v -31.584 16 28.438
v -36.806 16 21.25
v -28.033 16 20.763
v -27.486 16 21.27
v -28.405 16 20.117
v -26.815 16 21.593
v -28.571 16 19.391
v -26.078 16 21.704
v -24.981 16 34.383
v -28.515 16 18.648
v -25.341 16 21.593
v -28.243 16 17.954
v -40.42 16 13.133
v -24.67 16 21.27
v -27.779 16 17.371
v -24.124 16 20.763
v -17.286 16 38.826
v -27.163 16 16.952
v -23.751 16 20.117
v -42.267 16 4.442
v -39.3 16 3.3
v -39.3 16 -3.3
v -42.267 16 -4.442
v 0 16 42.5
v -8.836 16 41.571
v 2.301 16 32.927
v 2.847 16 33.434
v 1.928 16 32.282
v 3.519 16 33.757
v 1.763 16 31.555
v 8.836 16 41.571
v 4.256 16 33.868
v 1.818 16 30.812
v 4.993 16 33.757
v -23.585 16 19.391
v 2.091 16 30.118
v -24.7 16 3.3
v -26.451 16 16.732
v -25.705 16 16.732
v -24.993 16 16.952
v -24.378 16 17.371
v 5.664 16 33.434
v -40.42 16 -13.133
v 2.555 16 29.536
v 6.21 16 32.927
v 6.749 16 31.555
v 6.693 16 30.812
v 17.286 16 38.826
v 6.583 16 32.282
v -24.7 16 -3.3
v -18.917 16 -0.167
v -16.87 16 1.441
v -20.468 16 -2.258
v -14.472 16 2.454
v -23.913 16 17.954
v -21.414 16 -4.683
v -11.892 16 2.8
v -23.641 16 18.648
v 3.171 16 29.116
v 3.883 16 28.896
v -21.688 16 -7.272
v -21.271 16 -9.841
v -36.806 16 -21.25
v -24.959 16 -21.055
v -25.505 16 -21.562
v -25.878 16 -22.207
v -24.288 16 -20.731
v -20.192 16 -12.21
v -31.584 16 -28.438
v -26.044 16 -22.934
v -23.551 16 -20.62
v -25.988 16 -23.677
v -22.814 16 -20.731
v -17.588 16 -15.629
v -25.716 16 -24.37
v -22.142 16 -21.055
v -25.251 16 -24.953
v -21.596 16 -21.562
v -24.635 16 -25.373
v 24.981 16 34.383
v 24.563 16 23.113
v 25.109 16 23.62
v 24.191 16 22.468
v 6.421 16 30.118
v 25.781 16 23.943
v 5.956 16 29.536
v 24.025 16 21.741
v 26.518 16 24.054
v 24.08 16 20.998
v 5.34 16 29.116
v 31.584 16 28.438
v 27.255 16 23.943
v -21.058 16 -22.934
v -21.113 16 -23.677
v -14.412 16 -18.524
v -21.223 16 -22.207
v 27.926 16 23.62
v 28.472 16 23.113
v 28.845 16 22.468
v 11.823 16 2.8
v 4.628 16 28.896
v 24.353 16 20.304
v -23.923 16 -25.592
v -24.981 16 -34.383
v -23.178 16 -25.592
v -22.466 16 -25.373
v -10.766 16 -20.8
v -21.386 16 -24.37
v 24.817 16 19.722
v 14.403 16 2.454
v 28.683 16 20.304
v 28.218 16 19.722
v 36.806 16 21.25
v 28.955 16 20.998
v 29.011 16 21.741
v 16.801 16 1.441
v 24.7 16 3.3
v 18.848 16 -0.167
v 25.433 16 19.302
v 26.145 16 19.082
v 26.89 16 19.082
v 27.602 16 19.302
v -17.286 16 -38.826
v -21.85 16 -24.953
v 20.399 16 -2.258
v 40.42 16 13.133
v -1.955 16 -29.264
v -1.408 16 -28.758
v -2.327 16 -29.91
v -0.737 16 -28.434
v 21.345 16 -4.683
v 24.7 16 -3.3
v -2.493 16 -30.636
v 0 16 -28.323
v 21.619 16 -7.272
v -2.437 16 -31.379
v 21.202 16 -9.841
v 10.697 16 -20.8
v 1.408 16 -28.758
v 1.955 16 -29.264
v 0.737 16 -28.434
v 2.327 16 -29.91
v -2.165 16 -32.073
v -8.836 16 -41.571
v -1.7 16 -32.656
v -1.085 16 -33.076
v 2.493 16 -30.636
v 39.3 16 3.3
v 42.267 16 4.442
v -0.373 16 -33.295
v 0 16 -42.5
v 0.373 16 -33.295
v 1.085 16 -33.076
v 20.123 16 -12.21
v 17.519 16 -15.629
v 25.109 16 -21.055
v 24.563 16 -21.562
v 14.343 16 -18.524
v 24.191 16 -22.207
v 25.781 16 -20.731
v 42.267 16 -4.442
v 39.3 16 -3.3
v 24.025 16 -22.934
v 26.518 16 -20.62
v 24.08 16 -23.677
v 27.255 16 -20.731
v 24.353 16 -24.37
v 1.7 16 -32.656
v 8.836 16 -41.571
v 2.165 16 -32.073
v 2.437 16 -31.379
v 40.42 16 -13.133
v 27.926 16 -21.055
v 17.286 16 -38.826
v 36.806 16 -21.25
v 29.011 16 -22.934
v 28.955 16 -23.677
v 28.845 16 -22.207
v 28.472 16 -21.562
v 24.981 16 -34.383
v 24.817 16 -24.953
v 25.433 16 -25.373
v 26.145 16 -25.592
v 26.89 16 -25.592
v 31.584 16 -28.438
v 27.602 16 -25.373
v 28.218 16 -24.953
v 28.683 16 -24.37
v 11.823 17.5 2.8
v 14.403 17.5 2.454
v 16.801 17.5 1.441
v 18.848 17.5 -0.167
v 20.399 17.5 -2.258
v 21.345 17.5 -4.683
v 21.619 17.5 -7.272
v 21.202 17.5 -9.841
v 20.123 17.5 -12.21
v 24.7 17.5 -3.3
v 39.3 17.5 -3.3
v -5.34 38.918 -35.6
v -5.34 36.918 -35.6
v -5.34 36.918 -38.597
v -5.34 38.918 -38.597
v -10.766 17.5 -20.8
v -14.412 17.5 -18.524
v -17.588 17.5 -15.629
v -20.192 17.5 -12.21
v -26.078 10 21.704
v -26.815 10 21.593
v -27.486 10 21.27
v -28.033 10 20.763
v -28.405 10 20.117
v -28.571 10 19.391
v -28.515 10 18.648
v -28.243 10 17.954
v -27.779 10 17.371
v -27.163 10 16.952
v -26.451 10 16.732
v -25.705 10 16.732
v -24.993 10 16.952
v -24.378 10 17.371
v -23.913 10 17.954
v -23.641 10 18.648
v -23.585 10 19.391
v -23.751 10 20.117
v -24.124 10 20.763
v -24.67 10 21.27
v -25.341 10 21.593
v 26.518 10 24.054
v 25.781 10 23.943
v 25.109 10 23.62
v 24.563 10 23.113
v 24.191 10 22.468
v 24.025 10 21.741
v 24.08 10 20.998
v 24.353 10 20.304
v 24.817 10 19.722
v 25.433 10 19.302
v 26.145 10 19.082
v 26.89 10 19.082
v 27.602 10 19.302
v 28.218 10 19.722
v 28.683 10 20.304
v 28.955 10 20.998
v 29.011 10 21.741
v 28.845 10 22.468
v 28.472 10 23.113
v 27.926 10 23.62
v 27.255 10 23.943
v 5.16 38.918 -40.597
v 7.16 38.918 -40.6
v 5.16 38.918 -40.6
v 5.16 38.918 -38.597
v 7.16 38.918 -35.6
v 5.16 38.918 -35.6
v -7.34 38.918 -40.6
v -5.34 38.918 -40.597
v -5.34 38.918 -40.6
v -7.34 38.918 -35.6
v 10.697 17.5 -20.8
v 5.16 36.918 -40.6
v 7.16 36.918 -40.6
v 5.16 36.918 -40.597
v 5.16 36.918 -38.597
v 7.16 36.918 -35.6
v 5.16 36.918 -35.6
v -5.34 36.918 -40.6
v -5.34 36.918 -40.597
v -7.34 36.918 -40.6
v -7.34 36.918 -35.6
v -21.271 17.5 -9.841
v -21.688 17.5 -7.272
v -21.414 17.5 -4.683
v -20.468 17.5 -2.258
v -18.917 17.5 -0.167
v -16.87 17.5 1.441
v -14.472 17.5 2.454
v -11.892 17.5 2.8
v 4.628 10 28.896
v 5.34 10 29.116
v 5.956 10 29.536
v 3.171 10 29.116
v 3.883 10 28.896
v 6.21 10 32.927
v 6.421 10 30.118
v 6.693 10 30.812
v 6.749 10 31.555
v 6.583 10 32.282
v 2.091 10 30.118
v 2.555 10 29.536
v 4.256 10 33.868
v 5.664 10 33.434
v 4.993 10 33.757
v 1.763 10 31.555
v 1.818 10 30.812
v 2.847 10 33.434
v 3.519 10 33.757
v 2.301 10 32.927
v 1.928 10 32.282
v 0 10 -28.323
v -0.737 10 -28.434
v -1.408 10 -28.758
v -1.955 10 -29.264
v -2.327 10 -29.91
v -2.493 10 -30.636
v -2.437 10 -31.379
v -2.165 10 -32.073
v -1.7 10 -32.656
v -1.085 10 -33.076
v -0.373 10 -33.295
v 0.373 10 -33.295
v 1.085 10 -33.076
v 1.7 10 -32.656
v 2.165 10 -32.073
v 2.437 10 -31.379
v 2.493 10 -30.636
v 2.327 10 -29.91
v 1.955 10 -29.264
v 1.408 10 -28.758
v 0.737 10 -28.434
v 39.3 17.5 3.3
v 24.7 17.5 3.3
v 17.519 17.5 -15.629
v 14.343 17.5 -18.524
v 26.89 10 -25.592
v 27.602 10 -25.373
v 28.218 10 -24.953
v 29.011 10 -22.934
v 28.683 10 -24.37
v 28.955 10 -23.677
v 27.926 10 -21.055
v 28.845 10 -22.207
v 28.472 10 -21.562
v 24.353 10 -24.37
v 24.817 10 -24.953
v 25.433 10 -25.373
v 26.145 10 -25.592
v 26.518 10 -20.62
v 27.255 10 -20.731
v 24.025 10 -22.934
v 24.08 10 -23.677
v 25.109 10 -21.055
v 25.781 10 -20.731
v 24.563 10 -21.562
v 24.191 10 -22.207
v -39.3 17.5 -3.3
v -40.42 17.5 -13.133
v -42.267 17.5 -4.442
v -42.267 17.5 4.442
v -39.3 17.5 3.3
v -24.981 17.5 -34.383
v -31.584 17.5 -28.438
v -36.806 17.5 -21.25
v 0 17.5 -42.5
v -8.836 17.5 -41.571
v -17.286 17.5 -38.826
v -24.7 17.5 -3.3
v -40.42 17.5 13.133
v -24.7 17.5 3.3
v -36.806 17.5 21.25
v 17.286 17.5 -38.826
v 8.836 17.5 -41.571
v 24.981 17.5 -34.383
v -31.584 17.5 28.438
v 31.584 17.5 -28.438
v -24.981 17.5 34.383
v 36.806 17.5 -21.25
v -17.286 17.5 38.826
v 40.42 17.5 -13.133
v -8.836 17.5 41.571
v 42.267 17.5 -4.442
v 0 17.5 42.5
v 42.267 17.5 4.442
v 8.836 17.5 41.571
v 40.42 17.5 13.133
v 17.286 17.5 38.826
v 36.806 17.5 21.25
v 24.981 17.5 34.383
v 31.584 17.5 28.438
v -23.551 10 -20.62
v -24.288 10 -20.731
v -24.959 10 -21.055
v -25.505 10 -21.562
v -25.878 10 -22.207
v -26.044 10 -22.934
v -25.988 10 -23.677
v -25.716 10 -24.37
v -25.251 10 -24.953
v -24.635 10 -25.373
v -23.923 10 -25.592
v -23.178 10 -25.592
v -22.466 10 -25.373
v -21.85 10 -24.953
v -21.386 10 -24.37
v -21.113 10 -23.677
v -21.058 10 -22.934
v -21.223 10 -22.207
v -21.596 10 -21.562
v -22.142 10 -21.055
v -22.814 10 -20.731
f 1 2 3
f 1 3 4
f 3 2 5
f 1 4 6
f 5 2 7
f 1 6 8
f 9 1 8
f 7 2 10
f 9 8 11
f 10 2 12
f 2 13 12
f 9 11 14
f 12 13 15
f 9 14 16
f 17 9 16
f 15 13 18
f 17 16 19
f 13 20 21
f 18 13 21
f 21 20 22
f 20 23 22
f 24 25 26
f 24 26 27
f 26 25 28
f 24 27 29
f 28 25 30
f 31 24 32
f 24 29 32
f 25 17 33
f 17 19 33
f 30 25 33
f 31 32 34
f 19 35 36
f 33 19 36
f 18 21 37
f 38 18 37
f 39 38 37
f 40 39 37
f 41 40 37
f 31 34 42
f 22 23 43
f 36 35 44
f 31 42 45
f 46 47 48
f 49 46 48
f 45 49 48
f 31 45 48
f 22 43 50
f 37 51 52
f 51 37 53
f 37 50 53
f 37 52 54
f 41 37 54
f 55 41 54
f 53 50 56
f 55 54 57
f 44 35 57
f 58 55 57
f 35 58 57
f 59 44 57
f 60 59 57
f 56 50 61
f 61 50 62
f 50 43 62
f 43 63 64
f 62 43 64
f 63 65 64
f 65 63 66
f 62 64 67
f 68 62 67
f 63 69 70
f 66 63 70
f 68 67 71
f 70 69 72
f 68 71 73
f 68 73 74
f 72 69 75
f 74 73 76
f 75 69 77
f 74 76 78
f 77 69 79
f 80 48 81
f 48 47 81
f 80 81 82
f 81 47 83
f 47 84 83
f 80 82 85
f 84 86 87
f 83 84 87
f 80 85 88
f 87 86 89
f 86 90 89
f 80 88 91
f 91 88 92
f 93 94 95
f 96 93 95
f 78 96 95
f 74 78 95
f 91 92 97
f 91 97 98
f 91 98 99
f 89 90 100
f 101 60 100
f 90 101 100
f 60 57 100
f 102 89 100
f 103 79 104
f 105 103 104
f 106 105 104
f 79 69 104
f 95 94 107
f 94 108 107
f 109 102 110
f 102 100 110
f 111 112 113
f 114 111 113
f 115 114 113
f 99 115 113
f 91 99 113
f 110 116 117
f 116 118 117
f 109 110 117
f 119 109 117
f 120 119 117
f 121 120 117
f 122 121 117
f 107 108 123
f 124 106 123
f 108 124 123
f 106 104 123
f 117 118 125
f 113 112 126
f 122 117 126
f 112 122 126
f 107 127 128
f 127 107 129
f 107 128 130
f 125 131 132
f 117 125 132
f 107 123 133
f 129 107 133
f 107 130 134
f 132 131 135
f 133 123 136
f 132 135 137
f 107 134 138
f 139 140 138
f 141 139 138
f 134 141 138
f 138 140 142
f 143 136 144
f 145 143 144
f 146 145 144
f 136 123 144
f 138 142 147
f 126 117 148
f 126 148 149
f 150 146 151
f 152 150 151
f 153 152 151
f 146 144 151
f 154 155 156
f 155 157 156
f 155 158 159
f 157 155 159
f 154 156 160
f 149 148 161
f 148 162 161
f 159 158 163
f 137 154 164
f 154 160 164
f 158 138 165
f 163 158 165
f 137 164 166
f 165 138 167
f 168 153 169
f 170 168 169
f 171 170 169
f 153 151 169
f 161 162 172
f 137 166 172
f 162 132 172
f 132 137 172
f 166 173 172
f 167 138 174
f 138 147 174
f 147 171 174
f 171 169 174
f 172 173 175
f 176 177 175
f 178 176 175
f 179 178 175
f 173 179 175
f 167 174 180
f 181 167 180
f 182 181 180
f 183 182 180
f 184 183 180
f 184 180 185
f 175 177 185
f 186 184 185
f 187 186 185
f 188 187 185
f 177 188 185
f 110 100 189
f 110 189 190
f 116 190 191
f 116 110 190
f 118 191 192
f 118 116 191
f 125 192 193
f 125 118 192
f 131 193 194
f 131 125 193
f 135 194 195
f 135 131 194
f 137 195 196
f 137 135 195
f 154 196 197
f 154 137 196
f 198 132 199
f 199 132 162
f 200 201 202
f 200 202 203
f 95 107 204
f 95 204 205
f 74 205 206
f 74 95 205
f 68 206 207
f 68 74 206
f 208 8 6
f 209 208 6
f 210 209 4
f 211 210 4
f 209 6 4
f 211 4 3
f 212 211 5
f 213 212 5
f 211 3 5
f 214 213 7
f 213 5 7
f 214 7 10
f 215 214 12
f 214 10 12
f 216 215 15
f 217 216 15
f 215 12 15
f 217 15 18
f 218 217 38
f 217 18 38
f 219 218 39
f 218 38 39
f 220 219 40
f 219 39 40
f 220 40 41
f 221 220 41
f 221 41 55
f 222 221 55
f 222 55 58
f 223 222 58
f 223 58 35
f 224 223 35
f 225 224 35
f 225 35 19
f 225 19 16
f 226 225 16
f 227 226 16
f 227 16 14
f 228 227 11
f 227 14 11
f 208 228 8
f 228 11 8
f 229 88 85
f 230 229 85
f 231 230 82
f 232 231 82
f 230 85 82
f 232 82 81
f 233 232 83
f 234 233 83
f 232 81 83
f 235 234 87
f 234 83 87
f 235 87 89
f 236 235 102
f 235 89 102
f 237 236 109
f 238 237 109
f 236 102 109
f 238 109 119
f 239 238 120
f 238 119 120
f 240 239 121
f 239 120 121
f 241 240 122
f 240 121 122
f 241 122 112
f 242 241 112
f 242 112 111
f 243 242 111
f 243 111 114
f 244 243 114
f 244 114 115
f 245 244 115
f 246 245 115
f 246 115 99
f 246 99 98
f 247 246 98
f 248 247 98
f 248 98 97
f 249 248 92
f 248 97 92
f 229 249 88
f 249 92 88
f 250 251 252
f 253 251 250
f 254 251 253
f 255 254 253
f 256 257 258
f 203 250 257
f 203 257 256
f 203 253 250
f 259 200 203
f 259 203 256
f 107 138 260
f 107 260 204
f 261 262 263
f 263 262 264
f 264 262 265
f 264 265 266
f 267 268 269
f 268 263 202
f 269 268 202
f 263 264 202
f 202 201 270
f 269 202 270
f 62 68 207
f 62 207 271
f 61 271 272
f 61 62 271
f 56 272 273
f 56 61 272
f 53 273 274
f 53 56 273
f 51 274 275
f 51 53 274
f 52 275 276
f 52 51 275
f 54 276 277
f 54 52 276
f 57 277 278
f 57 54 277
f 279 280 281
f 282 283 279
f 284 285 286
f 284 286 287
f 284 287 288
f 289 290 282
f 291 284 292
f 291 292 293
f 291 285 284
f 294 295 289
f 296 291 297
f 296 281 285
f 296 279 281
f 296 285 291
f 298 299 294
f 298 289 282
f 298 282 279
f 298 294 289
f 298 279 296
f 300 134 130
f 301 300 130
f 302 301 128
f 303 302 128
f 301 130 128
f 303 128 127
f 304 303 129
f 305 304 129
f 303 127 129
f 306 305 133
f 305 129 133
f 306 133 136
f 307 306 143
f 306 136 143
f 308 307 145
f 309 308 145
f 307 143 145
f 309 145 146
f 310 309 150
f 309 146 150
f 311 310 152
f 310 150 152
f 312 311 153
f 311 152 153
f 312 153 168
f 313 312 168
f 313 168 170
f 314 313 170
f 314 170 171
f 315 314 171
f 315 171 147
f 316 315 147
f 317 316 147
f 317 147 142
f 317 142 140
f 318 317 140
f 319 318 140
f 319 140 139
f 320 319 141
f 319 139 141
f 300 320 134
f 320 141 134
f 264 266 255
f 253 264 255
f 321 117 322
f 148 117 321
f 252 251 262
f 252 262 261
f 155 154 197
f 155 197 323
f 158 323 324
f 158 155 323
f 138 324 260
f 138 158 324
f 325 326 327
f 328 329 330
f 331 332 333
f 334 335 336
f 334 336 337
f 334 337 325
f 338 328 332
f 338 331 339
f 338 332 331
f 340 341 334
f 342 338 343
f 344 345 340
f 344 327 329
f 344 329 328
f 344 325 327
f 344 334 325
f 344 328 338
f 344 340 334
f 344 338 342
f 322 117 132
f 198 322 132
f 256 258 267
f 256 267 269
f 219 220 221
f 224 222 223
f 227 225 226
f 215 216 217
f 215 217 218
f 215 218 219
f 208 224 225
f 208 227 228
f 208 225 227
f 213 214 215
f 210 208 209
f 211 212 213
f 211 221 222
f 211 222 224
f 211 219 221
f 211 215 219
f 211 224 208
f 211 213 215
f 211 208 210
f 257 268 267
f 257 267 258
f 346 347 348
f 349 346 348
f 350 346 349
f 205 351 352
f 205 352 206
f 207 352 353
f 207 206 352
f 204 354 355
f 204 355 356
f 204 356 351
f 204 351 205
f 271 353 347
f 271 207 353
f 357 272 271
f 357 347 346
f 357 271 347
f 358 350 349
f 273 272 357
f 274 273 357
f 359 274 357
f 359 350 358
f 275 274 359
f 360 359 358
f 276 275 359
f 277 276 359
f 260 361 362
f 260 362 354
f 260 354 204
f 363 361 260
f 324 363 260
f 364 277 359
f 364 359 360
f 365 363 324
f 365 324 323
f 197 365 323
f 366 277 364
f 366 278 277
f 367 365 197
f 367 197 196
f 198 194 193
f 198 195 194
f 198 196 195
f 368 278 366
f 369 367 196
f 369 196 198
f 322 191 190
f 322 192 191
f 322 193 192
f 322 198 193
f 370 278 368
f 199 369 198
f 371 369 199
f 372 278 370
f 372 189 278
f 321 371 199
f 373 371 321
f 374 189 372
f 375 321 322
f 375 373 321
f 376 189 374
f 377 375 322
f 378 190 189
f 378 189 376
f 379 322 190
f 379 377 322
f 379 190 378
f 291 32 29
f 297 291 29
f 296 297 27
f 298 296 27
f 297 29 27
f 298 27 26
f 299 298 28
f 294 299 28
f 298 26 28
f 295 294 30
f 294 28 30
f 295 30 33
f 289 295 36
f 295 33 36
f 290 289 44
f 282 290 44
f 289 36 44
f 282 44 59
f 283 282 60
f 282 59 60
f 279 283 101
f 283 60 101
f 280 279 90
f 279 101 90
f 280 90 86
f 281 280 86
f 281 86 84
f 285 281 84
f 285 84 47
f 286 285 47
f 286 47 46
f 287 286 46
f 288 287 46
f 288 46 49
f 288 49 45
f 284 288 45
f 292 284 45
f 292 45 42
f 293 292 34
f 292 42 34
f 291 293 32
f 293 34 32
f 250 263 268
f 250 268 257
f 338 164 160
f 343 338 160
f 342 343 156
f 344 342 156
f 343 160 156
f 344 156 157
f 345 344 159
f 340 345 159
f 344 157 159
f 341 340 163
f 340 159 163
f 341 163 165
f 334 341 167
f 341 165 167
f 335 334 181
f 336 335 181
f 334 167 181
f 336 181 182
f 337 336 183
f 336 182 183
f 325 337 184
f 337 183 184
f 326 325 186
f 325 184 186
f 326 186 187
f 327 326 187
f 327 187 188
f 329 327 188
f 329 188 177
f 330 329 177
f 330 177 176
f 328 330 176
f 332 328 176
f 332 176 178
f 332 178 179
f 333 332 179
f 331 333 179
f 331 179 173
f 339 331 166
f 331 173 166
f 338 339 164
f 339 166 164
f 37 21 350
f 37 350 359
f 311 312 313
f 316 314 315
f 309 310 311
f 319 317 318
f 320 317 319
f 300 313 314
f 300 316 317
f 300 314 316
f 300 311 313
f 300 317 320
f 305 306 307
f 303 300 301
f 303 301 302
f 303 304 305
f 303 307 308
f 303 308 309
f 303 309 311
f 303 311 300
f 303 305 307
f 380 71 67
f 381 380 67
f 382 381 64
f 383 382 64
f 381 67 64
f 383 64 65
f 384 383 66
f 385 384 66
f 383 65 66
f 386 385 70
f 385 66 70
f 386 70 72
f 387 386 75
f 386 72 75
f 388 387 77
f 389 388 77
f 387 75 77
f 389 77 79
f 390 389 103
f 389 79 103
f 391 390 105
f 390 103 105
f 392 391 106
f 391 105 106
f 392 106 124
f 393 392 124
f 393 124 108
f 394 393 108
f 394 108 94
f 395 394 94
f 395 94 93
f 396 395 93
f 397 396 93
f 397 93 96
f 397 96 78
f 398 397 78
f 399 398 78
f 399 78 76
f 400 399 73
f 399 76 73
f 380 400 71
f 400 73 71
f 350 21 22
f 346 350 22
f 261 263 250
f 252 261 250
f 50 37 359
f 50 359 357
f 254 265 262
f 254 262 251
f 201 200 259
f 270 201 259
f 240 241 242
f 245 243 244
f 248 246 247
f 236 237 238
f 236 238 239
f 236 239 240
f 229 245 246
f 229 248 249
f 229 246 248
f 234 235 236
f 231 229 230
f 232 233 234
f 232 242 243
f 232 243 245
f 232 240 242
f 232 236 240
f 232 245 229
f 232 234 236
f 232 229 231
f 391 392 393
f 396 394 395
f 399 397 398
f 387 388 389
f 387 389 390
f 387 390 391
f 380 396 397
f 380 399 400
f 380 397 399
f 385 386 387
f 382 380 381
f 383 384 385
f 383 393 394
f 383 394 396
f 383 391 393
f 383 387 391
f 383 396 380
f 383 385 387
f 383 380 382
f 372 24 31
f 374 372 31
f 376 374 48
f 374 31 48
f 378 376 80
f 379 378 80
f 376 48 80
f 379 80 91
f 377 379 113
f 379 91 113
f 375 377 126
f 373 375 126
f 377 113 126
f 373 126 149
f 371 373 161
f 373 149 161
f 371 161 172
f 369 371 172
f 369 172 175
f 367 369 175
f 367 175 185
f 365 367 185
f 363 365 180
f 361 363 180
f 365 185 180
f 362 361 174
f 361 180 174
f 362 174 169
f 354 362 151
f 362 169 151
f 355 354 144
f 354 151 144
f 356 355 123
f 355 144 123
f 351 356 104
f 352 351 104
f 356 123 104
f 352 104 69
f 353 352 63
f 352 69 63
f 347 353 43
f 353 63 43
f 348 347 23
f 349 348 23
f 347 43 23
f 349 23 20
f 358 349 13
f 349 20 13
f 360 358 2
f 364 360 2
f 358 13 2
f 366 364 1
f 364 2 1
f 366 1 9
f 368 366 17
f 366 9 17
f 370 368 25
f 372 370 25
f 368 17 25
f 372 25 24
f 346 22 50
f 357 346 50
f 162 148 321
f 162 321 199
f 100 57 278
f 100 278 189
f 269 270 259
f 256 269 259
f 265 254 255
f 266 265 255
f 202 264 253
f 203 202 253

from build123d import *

# Parameters (mm, degrees)
CUT_EXTRUDE1_DEPTH           = 5
CUT_EXTRUDE3_DEPTH           = 60
SKETCH8_R                    = 43
CUT_EXTRUDE4_DEPTH           = 53
FILLET1_R                    = 7
SKETCH12_W                   = 6.5
SKETCH12_H                   = 51.5
CUT_REVOLVE1_ANGLE           = 60
CUT_REVOLVE1_OTHER_WAY_ANGLE = 60
SKETCH18_W                   = 13
SKETCH18_H                   = 8
CUT_EXTRUDE13_DEPTH          = 5
SKETCH20_W                   = 100
SKETCH20_H                   = 7
CUT_EXTRUDE15_DEPTH          = 5
SKETCH19_R                   = 1.5
CUT_EXTRUDE14_DEPTH          = 12
FILLET3_R                    = 4
SKETCH24_W                   = 2
SKETCH24_H                   = 3
BOSS_EXTRUDE3_DEPTH          = 2
CIRPATTERN2_COUNT            = 5
SKETCH26_W                   = 5
SKETCH26_H                   = 51.5
CUT_REVOLVE2_ANGLE           = 50
CUT_REVOLVE2_OTHER_WAY_ANGLE = 50
SKETCH29_W                   = 16.2
SKETCH29_H                   = 11.2
SKETCH29_W_2                 = 13
SKETCH29_H_2                 = 8
BOSS_EXTRUDE4_DEPTH          = 19
SKETCH36_W                   = 2
SKETCH36_H                   = 2
BOSS_EXTRUDE7_DEPTH          = 5
SKETCH37_W                   = 2
SKETCH37_H                   = 2
BOSS_EXTRUDE8_DEPTH          = 12.5
SKETCH40_W                   = 2
SKETCH40_H                   = 2
BOSS_EXTRUDE9_DEPTH          = 5
FILLET8_R                    = 9
SKETCH50_W                   = 13
SKETCH50_H                   = 5
CUT_EXTRUDE23_DEPTH          = 7
SKETCH51_R                   = 42.5
SKETCH51_W                   = 14.6
SKETCH51_H                   = 6.6
BOSS_EXTRUDE10_DEPTH         = 1.5
INTERSECT2_START             = 17.5
INTERSECT2_OUTLINE_R         = 45
INTERSECT2_OUTLINE_W         = 13
INTERSECT2_OUTLINE_H         = 8
INTERSECT2_DEPTH             = 59
INTERSECT2_2_OUTLINE_R       = 45
INTERSECT2_2_OUTLINE_W       = 13
INTERSECT2_2_OUTLINE_H       = 5
INTERSECT2_2_DEPTH           = 16
INTERSECT2_START_2           = 16
INTERSECT2_3_OUTLINE_R       = 45
INTERSECT2_3_OUTLINE_R_2     = 43
INTERSECT2_3_DEPTH           = 1.5
SKETCH52_R                   = 2.5
BOSS_EXTRUDE11_DEPTH         = 6


# Read off the part's stored shape, not the designer's step: Intersect2
with BuildPart() as part:
    # Sketch1 → Revolve1 (revolve)
    with BuildSketch(Plane.XY, mode=Mode.PRIVATE) as revolve1_sk:
        with BuildLine():
            Line((0, 76.5), (0, 11.5))
            Line((0, 11.5), (22.5, 11.5))
            Line((22.5, 11.5), (22.5, 0))
            Line((22.5, 0), (25, 0))
            Line((25, 0), (25, 11.5))
            Line((25, 11.5), (45, 11.5))
            Line((45, 11.5), (45, 71.5))
            ThreePointArc((45, 71.5), (43.535533906, 75.035533906), (40, 76.5))
            Line((40, 76.5), (0, 76.5))
        make_face()
    revolve(revolve1_sk.sketch.rotate(Axis((0, 2, 0), (0, 1, 0)), 90), axis=Axis((0, 2, 0), (0, 1, 0)))

    # Sketch5 → Cut-Extrude1 (cut)
    with BuildSketch(Plane(origin=(0, 76.5, 0), x_dir=(1, 0, 0), z_dir=(0, 1, 0))):
        with BuildLine():
            Line((-45, 0), (45, 0))
            ThreePointArc((45, 0), (0, 45), (-45, 0))
        make_face()
    extrude(amount=-CUT_EXTRUDE1_DEPTH, mode=Mode.SUBTRACT)

    # Sketch7 → Cut-Extrude3 (cut)
    with BuildSketch(Plane.XZ.offset(-11.5)):
        with BuildLine():
            Line((21, 0), (-21, 0))
            ThreePointArc((-21, 0), (-18.277714988, -10.340461055), (-10.816653826, -18))
            Line((-10.816653826, -18), (10.816653826, -18))
            ThreePointArc((10.816653826, -18), (18.277714988, -10.340461055), (21, 0))
        make_face()
    extrude(amount=-CUT_EXTRUDE3_DEPTH, mode=Mode.SUBTRACT)

    # Sketch8 → Cut-Extrude4 (cut)
    with BuildSketch(Plane(origin=(0, 69, 0), x_dir=(1, 0, 0), z_dir=(0, 1, 0))):
        with Locations(Location((0, 0, 0), (0, 0, 270))):
            Circle(SKETCH8_R)
        with BuildLine():
            Line((22.912878475, -2), (-22.981606036, -2))
            ThreePointArc((-22.981606036, -2), (-20.067855169, 10.855581536), (-10.573881727, 20))
            Line((-10.573881727, 20), (10.505154166, 20))
            ThreePointArc((10.505154166, 20), (19.999127608, 10.855581536), (22.912878475, -2))
        make_face(mode=Mode.SUBTRACT)
    extrude(amount=-CUT_EXTRUDE4_DEPTH, mode=Mode.SUBTRACT)

    # Fillet1
    fillet1_edges = [part.edges().sort_by_distance(p)[0] for p in [
        (-21, 41.5, 0),
        (21, 41.5, 0),
    ]]
    fillet(fillet1_edges, radius=FILLET1_R)

    # Sketch12 → Cut-Revolve1 (revolve, cut)
    with BuildSketch(Plane(origin=(0, 0, 0), x_dir=(0, 0, -1), z_dir=(1, 0, 0))):
        with Locations((-44.75, 43.25)):
            Rectangle(SKETCH12_W, SKETCH12_H)
    revolve(axis=Axis((0, 71.5, 0), (0, -1, 0)), revolution_arc=CUT_REVOLVE1_ANGLE, mode=Mode.SUBTRACT)

    # Sketch12 → Cut-Revolve1 other way (revolve, cut)
    with BuildSketch(Plane(origin=(0, 0, 0), x_dir=(0, 0, -1), z_dir=(1, 0, 0))):
        with Locations((-44.75, 43.25)):
            Rectangle(SKETCH12_W, SKETCH12_H)
    revolve(axis=Axis((0, 71.5, 0), (0, 1, 0)), revolution_arc=CUT_REVOLVE1_OTHER_WAY_ANGLE, mode=Mode.SUBTRACT)

    # Sketch18 → Cut-Extrude13 (cut)
    with BuildSketch(Plane(origin=(0, 71.5, 0), x_dir=(1, 0, 0), z_dir=(0, 1, 0))):
        with Locations((0, 30)):
            Rectangle(SKETCH18_W, SKETCH18_H)
    extrude(amount=-CUT_EXTRUDE13_DEPTH, mode=Mode.SUBTRACT)

    # Sketch20 → Cut-Extrude15 (cut)
    with BuildSketch(Plane(origin=(0, 76.5, 0), x_dir=(1, 0, 0), z_dir=(0, 1, 0))):
        with Locations((0, -3.5)):
            Rectangle(SKETCH20_W, SKETCH20_H)
    extrude(amount=-CUT_EXTRUDE15_DEPTH, mode=Mode.SUBTRACT)

    # Sketch19 → Cut-Extrude14 (cut)
    with BuildSketch(Plane(origin=(0, 0, 7), x_dir=(-1, 0, 0), z_dir=(0, 0, -1))):
        with Locations((0, 74)):
            Circle(SKETCH19_R)
        with Locations((-30, 74)):
            Circle(SKETCH19_R)
        with Locations((29.452221542, 74)):
            Circle(SKETCH19_R)
    extrude(amount=-CUT_EXTRUDE14_DEPTH, mode=Mode.SUBTRACT)

    # Fillet3
    fillet3_edges = [part.edges().sort_by_distance(p)[0] for p in [
        (0, 11.5, 45),
    ]]
    fillet(fillet3_edges, radius=FILLET3_R)

    # Sketch24 → Boss-Extrude3 (add)
    with BuildSketch(Plane.XZ):
        with Locations((0, -22.5)):
            Rectangle(SKETCH24_W, SKETCH24_H)
    boss_extrude3 = extrude(amount=-BOSS_EXTRUDE3_DEPTH)

    # CirPattern2: Boss-Extrude3 ×5 about axis
    cirpattern2_axis = Axis((0, 0, 0), (0, 1, 0))
    for i in range(1, CIRPATTERN2_COUNT):
        add(boss_extrude3.rotate(cirpattern2_axis, i * 360 / CIRPATTERN2_COUNT))

    # Sketch26 → Cut-Revolve2 (revolve, cut)
    with BuildSketch(Plane(origin=(0, 0, 0), x_dir=(0, 0, -1), z_dir=(1, 0, 0))):
        with Locations((45.056943441, 43.25)):
            Rectangle(SKETCH26_W, SKETCH26_H)
    revolve(axis=Axis((0, 2, 0), (0, -1, 0)), revolution_arc=CUT_REVOLVE2_ANGLE, mode=Mode.SUBTRACT)

    # Sketch26 → Cut-Revolve2 other way (revolve, cut)
    with BuildSketch(Plane(origin=(0, 0, 0), x_dir=(0, 0, -1), z_dir=(1, 0, 0))):
        with Locations((45.056943441, 43.25)):
            Rectangle(SKETCH26_W, SKETCH26_H)
    revolve(axis=Axis((0, 2, 0), (0, 1, 0)), revolution_arc=CUT_REVOLVE2_OTHER_WAY_ANGLE, mode=Mode.SUBTRACT)

    # Sketch29 → Boss-Extrude4 (add)
    with BuildSketch(Plane.XZ.offset(-69)):
        with Locations((0, -30)):
            Rectangle(SKETCH29_W, SKETCH29_H)
        with Locations((0, -30)):
            Rectangle(SKETCH29_W_2, SKETCH29_H_2, mode=Mode.SUBTRACT)
    extrude(amount=BOSS_EXTRUDE4_DEPTH)

    # Fillet8
    fillet8_edges = [part.edges().sort_by_distance(p)[0] for p in [
        (-22.981606036, 42.5, 2),
        (22.912878475, 42.5, 2),
    ]]
    fillet(fillet8_edges, radius=FILLET8_R)

    # Sketch50 → Cut-Extrude23 (cut)
    with BuildSketch(Plane(origin=(0, 16, 0), x_dir=(1, 0, 0), z_dir=(0, 1, 0))):
        with Locations((32, 0)):
            Rectangle(SKETCH50_W, SKETCH50_H)
        with Locations((-32, 0)):
            Rectangle(SKETCH50_W, SKETCH50_H)
    extrude(amount=-CUT_EXTRUDE23_DEPTH, mode=Mode.SUBTRACT)

    # Sketch51 → Boss-Extrude10 (add)
    with BuildSketch(Plane(origin=(0, 16, 0), x_dir=(1, 0, 0), z_dir=(0, 1, 0))):
        with Locations(Location((0, 0, 0), (0, 0, 270))):
            Circle(SKETCH51_R)
        with Locations((32, 0)):
            Rectangle(SKETCH51_W, SKETCH51_H, mode=Mode.SUBTRACT)
        with Locations((-32, 0)):
            Rectangle(SKETCH51_W, SKETCH51_H, mode=Mode.SUBTRACT)
        with BuildLine():
            ThreePointArc((-20.192156993, 12.210139591), (-20.468000439, 2.257604402), (-11.8918892, -2.8))
            Line((-11.8918892, -2.8), (11.823161639, -2.8))
            ThreePointArc((11.823161639, -2.8), (20.399272878, 2.257604402), (20.123429432, 12.210139591))
            ThreePointArc((20.123429432, 12.210139591), (15.996509538, 17.148165703), (10.697483593, 20.8))
            Line((10.697483593, 20.8), (-10.766211154, 20.8))
            ThreePointArc((-10.766211154, 20.8), (-16.065237099, 17.148165703), (-20.192156993, 12.210139591))
        make_face(mode=Mode.SUBTRACT)
    extrude(amount=BOSS_EXTRUDE10_DEPTH)

    # Intersect2 outline → Intersect2 (cut)
    with BuildSketch(Plane(origin=(0, 0, 0), x_dir=(1, 0, 0), z_dir=(0, 1, 0)).offset(INTERSECT2_START)):
        Circle(INTERSECT2_OUTLINE_R)
        with Locations((0, 30)):
            Rectangle(INTERSECT2_OUTLINE_W, INTERSECT2_OUTLINE_H, mode=Mode.SUBTRACT)
        with BuildLine():
            ThreePointArc((-18.186533479, 10.5), (-14.978608696, 14.718739128), (-10.816653826, 18))
            Line((-10.816653826, 18), (10.816653826, 18))
            ThreePointArc((10.816653826, 18), (14.978608696, 14.718739128), (18.186533479, 10.5))
            ThreePointArc((18.186533479, 10.5), (18.186533479, 3.5), (12.124355653, 0))
            Line((12.124355653, 0), (-12.124355653, 0))
            ThreePointArc((-12.124355653, 0), (-18.186533479, 3.5), (-18.186533479, 10.5))
        make_face(mode=Mode.SUBTRACT)
    extrude(amount=INTERSECT2_DEPTH, mode=Mode.SUBTRACT)

    # Intersect2 2 outline → Intersect2 2 (cut)
    with BuildSketch(Plane(origin=(0, 0, 0), x_dir=(1, 0, 0), z_dir=(0, 1, 0))):
        Circle(INTERSECT2_2_OUTLINE_R)
        with Locations((-32, 0)):
            Rectangle(INTERSECT2_2_OUTLINE_W, INTERSECT2_2_OUTLINE_H, mode=Mode.SUBTRACT)
        with Locations((32, 0)):
            Rectangle(INTERSECT2_2_OUTLINE_W, INTERSECT2_2_OUTLINE_H, mode=Mode.SUBTRACT)
        with BuildLine():
            ThreePointArc((-18.186533479, 10.5), (-14.978608696, 14.718739128), (-10.816653826, 18))
            Line((-10.816653826, 18), (10.816653826, 18))
            ThreePointArc((10.816653826, 18), (14.978608696, 14.718739128), (18.186533479, 10.5))
            ThreePointArc((18.186533479, 10.5), (18.186533479, 3.5), (12.124355653, 0))
            Line((12.124355653, 0), (-12.124355653, 0))
            ThreePointArc((-12.124355653, 0), (-18.186533479, 3.5), (-18.186533479, 10.5))
        make_face(mode=Mode.SUBTRACT)
    extrude(amount=INTERSECT2_2_DEPTH, mode=Mode.SUBTRACT)

    # Intersect2 3 outline → Intersect2 3 (cut)
    # profile 1 of 2: a face of its own
    with BuildSketch(Plane(origin=(0, 0, 0), x_dir=(1, 0, 0), z_dir=(0, 1, 0)).offset(INTERSECT2_START_2)):
        Circle(INTERSECT2_3_OUTLINE_R)
        Circle(INTERSECT2_3_OUTLINE_R_2, mode=Mode.SUBTRACT)
    # profile 2 of 2: a face of its own
    with BuildSketch(Plane(origin=(0, 0, 0), x_dir=(1, 0, 0), z_dir=(0, 1, 0)).offset(INTERSECT2_START_2)):
        with BuildLine():
            Line((-11.8918892, -2), (11.823161639, -2))
            ThreePointArc((11.823161639, -2), (19.699182165, 2.644738737), (19.445856551, 11.784822073))
            ThreePointArc((19.445856551, 11.784822073), (15.52739893, 16.493045158), (10.505154166, 20))
            Line((10.505154166, 20), (-10.573881727, 20))
            ThreePointArc((-10.573881727, 20), (-15.596126491, 16.493045158), (-19.514584112, 11.784822073))
            ThreePointArc((-19.514584112, 11.784822073), (-19.767909726, 2.644738737), (-11.8918892, -2))
        make_face()
        with BuildLine():
            Line((-10.816653826, 18), (10.816653826, 18))
            ThreePointArc((10.816653826, 18), (14.978608696, 14.718739128), (18.186533479, 10.5))
            ThreePointArc((18.186533479, 10.5), (18.186533479, 3.5), (12.124355653, 0))
            Line((12.124355653, 0), (-12.124355653, 0))
            ThreePointArc((-12.124355653, 0), (-18.186533479, 3.5), (-18.186533479, 10.5))
            ThreePointArc((-18.186533479, 10.5), (-14.978608696, 14.718739128), (-10.816653826, 18))
        make_face(mode=Mode.SUBTRACT)
    extrude(amount=INTERSECT2_3_DEPTH, mode=Mode.SUBTRACT)

    # Sketch52 → Boss-Extrude11 (add)
    with BuildSketch(Plane.XZ.offset(-16)):
        with Locations(Location((26.517708618, 21.554294378, 0), (0, 0, 90))):
            Circle(SKETCH52_R)
        with Locations(Location((4.255662389, 31.368306058, 0), (0, 0, 90))):
            Circle(SKETCH52_R)
        with Locations(Location((-26.078081375, 19.203965316, 0), (0, 0, 90))):
            Circle(SKETCH52_R)
        with Locations(Location((-23.550645182, -23.120332988, 0), (0, 0, 90))):
            Circle(SKETCH52_R)
        with Locations(Location((0, -30.823145317, 0), (0, 0, 90))):
            Circle(SKETCH52_R)
        with Locations(Location((26.517708618, -23.120332988, 0), (0, 0, 90))):
            Circle(SKETCH52_R)
    extrude(amount=BOSS_EXTRUDE11_DEPTH)


with BuildPart() as body_2:
    # Sketch36 → Boss-Extrude7 (new body)
    with BuildSketch(Plane(origin=(0, 0, -35.6), x_dir=(-1, 0, 0), z_dir=(0, 0, -1))):
        with Locations((-6.159647943, 37.918102195)):
            Rectangle(SKETCH36_W, SKETCH36_H)
    extrude(amount=BOSS_EXTRUDE7_DEPTH)

    # Sketch37 → Boss-Extrude8 (add)
    with BuildSketch(Plane.ZY.offset(-5.159647943)):
        with Locations((-39.597351245, 37.918102195)):
            Rectangle(SKETCH37_W, SKETCH37_H)
    extrude(amount=BOSS_EXTRUDE8_DEPTH)

    # Sketch40 → Boss-Extrude9 (add)
    with BuildSketch(Plane(origin=(0, 0, -35.6), x_dir=(-1, 0, 0), z_dir=(0, 0, -1))):
        with Locations((6.340352057, 37.918102195)):
            Rectangle(SKETCH40_W, SKETCH40_H)
    extrude(amount=BOSS_EXTRUDE9_DEPTH)


solid = Compound([part.part, body_2.part])
